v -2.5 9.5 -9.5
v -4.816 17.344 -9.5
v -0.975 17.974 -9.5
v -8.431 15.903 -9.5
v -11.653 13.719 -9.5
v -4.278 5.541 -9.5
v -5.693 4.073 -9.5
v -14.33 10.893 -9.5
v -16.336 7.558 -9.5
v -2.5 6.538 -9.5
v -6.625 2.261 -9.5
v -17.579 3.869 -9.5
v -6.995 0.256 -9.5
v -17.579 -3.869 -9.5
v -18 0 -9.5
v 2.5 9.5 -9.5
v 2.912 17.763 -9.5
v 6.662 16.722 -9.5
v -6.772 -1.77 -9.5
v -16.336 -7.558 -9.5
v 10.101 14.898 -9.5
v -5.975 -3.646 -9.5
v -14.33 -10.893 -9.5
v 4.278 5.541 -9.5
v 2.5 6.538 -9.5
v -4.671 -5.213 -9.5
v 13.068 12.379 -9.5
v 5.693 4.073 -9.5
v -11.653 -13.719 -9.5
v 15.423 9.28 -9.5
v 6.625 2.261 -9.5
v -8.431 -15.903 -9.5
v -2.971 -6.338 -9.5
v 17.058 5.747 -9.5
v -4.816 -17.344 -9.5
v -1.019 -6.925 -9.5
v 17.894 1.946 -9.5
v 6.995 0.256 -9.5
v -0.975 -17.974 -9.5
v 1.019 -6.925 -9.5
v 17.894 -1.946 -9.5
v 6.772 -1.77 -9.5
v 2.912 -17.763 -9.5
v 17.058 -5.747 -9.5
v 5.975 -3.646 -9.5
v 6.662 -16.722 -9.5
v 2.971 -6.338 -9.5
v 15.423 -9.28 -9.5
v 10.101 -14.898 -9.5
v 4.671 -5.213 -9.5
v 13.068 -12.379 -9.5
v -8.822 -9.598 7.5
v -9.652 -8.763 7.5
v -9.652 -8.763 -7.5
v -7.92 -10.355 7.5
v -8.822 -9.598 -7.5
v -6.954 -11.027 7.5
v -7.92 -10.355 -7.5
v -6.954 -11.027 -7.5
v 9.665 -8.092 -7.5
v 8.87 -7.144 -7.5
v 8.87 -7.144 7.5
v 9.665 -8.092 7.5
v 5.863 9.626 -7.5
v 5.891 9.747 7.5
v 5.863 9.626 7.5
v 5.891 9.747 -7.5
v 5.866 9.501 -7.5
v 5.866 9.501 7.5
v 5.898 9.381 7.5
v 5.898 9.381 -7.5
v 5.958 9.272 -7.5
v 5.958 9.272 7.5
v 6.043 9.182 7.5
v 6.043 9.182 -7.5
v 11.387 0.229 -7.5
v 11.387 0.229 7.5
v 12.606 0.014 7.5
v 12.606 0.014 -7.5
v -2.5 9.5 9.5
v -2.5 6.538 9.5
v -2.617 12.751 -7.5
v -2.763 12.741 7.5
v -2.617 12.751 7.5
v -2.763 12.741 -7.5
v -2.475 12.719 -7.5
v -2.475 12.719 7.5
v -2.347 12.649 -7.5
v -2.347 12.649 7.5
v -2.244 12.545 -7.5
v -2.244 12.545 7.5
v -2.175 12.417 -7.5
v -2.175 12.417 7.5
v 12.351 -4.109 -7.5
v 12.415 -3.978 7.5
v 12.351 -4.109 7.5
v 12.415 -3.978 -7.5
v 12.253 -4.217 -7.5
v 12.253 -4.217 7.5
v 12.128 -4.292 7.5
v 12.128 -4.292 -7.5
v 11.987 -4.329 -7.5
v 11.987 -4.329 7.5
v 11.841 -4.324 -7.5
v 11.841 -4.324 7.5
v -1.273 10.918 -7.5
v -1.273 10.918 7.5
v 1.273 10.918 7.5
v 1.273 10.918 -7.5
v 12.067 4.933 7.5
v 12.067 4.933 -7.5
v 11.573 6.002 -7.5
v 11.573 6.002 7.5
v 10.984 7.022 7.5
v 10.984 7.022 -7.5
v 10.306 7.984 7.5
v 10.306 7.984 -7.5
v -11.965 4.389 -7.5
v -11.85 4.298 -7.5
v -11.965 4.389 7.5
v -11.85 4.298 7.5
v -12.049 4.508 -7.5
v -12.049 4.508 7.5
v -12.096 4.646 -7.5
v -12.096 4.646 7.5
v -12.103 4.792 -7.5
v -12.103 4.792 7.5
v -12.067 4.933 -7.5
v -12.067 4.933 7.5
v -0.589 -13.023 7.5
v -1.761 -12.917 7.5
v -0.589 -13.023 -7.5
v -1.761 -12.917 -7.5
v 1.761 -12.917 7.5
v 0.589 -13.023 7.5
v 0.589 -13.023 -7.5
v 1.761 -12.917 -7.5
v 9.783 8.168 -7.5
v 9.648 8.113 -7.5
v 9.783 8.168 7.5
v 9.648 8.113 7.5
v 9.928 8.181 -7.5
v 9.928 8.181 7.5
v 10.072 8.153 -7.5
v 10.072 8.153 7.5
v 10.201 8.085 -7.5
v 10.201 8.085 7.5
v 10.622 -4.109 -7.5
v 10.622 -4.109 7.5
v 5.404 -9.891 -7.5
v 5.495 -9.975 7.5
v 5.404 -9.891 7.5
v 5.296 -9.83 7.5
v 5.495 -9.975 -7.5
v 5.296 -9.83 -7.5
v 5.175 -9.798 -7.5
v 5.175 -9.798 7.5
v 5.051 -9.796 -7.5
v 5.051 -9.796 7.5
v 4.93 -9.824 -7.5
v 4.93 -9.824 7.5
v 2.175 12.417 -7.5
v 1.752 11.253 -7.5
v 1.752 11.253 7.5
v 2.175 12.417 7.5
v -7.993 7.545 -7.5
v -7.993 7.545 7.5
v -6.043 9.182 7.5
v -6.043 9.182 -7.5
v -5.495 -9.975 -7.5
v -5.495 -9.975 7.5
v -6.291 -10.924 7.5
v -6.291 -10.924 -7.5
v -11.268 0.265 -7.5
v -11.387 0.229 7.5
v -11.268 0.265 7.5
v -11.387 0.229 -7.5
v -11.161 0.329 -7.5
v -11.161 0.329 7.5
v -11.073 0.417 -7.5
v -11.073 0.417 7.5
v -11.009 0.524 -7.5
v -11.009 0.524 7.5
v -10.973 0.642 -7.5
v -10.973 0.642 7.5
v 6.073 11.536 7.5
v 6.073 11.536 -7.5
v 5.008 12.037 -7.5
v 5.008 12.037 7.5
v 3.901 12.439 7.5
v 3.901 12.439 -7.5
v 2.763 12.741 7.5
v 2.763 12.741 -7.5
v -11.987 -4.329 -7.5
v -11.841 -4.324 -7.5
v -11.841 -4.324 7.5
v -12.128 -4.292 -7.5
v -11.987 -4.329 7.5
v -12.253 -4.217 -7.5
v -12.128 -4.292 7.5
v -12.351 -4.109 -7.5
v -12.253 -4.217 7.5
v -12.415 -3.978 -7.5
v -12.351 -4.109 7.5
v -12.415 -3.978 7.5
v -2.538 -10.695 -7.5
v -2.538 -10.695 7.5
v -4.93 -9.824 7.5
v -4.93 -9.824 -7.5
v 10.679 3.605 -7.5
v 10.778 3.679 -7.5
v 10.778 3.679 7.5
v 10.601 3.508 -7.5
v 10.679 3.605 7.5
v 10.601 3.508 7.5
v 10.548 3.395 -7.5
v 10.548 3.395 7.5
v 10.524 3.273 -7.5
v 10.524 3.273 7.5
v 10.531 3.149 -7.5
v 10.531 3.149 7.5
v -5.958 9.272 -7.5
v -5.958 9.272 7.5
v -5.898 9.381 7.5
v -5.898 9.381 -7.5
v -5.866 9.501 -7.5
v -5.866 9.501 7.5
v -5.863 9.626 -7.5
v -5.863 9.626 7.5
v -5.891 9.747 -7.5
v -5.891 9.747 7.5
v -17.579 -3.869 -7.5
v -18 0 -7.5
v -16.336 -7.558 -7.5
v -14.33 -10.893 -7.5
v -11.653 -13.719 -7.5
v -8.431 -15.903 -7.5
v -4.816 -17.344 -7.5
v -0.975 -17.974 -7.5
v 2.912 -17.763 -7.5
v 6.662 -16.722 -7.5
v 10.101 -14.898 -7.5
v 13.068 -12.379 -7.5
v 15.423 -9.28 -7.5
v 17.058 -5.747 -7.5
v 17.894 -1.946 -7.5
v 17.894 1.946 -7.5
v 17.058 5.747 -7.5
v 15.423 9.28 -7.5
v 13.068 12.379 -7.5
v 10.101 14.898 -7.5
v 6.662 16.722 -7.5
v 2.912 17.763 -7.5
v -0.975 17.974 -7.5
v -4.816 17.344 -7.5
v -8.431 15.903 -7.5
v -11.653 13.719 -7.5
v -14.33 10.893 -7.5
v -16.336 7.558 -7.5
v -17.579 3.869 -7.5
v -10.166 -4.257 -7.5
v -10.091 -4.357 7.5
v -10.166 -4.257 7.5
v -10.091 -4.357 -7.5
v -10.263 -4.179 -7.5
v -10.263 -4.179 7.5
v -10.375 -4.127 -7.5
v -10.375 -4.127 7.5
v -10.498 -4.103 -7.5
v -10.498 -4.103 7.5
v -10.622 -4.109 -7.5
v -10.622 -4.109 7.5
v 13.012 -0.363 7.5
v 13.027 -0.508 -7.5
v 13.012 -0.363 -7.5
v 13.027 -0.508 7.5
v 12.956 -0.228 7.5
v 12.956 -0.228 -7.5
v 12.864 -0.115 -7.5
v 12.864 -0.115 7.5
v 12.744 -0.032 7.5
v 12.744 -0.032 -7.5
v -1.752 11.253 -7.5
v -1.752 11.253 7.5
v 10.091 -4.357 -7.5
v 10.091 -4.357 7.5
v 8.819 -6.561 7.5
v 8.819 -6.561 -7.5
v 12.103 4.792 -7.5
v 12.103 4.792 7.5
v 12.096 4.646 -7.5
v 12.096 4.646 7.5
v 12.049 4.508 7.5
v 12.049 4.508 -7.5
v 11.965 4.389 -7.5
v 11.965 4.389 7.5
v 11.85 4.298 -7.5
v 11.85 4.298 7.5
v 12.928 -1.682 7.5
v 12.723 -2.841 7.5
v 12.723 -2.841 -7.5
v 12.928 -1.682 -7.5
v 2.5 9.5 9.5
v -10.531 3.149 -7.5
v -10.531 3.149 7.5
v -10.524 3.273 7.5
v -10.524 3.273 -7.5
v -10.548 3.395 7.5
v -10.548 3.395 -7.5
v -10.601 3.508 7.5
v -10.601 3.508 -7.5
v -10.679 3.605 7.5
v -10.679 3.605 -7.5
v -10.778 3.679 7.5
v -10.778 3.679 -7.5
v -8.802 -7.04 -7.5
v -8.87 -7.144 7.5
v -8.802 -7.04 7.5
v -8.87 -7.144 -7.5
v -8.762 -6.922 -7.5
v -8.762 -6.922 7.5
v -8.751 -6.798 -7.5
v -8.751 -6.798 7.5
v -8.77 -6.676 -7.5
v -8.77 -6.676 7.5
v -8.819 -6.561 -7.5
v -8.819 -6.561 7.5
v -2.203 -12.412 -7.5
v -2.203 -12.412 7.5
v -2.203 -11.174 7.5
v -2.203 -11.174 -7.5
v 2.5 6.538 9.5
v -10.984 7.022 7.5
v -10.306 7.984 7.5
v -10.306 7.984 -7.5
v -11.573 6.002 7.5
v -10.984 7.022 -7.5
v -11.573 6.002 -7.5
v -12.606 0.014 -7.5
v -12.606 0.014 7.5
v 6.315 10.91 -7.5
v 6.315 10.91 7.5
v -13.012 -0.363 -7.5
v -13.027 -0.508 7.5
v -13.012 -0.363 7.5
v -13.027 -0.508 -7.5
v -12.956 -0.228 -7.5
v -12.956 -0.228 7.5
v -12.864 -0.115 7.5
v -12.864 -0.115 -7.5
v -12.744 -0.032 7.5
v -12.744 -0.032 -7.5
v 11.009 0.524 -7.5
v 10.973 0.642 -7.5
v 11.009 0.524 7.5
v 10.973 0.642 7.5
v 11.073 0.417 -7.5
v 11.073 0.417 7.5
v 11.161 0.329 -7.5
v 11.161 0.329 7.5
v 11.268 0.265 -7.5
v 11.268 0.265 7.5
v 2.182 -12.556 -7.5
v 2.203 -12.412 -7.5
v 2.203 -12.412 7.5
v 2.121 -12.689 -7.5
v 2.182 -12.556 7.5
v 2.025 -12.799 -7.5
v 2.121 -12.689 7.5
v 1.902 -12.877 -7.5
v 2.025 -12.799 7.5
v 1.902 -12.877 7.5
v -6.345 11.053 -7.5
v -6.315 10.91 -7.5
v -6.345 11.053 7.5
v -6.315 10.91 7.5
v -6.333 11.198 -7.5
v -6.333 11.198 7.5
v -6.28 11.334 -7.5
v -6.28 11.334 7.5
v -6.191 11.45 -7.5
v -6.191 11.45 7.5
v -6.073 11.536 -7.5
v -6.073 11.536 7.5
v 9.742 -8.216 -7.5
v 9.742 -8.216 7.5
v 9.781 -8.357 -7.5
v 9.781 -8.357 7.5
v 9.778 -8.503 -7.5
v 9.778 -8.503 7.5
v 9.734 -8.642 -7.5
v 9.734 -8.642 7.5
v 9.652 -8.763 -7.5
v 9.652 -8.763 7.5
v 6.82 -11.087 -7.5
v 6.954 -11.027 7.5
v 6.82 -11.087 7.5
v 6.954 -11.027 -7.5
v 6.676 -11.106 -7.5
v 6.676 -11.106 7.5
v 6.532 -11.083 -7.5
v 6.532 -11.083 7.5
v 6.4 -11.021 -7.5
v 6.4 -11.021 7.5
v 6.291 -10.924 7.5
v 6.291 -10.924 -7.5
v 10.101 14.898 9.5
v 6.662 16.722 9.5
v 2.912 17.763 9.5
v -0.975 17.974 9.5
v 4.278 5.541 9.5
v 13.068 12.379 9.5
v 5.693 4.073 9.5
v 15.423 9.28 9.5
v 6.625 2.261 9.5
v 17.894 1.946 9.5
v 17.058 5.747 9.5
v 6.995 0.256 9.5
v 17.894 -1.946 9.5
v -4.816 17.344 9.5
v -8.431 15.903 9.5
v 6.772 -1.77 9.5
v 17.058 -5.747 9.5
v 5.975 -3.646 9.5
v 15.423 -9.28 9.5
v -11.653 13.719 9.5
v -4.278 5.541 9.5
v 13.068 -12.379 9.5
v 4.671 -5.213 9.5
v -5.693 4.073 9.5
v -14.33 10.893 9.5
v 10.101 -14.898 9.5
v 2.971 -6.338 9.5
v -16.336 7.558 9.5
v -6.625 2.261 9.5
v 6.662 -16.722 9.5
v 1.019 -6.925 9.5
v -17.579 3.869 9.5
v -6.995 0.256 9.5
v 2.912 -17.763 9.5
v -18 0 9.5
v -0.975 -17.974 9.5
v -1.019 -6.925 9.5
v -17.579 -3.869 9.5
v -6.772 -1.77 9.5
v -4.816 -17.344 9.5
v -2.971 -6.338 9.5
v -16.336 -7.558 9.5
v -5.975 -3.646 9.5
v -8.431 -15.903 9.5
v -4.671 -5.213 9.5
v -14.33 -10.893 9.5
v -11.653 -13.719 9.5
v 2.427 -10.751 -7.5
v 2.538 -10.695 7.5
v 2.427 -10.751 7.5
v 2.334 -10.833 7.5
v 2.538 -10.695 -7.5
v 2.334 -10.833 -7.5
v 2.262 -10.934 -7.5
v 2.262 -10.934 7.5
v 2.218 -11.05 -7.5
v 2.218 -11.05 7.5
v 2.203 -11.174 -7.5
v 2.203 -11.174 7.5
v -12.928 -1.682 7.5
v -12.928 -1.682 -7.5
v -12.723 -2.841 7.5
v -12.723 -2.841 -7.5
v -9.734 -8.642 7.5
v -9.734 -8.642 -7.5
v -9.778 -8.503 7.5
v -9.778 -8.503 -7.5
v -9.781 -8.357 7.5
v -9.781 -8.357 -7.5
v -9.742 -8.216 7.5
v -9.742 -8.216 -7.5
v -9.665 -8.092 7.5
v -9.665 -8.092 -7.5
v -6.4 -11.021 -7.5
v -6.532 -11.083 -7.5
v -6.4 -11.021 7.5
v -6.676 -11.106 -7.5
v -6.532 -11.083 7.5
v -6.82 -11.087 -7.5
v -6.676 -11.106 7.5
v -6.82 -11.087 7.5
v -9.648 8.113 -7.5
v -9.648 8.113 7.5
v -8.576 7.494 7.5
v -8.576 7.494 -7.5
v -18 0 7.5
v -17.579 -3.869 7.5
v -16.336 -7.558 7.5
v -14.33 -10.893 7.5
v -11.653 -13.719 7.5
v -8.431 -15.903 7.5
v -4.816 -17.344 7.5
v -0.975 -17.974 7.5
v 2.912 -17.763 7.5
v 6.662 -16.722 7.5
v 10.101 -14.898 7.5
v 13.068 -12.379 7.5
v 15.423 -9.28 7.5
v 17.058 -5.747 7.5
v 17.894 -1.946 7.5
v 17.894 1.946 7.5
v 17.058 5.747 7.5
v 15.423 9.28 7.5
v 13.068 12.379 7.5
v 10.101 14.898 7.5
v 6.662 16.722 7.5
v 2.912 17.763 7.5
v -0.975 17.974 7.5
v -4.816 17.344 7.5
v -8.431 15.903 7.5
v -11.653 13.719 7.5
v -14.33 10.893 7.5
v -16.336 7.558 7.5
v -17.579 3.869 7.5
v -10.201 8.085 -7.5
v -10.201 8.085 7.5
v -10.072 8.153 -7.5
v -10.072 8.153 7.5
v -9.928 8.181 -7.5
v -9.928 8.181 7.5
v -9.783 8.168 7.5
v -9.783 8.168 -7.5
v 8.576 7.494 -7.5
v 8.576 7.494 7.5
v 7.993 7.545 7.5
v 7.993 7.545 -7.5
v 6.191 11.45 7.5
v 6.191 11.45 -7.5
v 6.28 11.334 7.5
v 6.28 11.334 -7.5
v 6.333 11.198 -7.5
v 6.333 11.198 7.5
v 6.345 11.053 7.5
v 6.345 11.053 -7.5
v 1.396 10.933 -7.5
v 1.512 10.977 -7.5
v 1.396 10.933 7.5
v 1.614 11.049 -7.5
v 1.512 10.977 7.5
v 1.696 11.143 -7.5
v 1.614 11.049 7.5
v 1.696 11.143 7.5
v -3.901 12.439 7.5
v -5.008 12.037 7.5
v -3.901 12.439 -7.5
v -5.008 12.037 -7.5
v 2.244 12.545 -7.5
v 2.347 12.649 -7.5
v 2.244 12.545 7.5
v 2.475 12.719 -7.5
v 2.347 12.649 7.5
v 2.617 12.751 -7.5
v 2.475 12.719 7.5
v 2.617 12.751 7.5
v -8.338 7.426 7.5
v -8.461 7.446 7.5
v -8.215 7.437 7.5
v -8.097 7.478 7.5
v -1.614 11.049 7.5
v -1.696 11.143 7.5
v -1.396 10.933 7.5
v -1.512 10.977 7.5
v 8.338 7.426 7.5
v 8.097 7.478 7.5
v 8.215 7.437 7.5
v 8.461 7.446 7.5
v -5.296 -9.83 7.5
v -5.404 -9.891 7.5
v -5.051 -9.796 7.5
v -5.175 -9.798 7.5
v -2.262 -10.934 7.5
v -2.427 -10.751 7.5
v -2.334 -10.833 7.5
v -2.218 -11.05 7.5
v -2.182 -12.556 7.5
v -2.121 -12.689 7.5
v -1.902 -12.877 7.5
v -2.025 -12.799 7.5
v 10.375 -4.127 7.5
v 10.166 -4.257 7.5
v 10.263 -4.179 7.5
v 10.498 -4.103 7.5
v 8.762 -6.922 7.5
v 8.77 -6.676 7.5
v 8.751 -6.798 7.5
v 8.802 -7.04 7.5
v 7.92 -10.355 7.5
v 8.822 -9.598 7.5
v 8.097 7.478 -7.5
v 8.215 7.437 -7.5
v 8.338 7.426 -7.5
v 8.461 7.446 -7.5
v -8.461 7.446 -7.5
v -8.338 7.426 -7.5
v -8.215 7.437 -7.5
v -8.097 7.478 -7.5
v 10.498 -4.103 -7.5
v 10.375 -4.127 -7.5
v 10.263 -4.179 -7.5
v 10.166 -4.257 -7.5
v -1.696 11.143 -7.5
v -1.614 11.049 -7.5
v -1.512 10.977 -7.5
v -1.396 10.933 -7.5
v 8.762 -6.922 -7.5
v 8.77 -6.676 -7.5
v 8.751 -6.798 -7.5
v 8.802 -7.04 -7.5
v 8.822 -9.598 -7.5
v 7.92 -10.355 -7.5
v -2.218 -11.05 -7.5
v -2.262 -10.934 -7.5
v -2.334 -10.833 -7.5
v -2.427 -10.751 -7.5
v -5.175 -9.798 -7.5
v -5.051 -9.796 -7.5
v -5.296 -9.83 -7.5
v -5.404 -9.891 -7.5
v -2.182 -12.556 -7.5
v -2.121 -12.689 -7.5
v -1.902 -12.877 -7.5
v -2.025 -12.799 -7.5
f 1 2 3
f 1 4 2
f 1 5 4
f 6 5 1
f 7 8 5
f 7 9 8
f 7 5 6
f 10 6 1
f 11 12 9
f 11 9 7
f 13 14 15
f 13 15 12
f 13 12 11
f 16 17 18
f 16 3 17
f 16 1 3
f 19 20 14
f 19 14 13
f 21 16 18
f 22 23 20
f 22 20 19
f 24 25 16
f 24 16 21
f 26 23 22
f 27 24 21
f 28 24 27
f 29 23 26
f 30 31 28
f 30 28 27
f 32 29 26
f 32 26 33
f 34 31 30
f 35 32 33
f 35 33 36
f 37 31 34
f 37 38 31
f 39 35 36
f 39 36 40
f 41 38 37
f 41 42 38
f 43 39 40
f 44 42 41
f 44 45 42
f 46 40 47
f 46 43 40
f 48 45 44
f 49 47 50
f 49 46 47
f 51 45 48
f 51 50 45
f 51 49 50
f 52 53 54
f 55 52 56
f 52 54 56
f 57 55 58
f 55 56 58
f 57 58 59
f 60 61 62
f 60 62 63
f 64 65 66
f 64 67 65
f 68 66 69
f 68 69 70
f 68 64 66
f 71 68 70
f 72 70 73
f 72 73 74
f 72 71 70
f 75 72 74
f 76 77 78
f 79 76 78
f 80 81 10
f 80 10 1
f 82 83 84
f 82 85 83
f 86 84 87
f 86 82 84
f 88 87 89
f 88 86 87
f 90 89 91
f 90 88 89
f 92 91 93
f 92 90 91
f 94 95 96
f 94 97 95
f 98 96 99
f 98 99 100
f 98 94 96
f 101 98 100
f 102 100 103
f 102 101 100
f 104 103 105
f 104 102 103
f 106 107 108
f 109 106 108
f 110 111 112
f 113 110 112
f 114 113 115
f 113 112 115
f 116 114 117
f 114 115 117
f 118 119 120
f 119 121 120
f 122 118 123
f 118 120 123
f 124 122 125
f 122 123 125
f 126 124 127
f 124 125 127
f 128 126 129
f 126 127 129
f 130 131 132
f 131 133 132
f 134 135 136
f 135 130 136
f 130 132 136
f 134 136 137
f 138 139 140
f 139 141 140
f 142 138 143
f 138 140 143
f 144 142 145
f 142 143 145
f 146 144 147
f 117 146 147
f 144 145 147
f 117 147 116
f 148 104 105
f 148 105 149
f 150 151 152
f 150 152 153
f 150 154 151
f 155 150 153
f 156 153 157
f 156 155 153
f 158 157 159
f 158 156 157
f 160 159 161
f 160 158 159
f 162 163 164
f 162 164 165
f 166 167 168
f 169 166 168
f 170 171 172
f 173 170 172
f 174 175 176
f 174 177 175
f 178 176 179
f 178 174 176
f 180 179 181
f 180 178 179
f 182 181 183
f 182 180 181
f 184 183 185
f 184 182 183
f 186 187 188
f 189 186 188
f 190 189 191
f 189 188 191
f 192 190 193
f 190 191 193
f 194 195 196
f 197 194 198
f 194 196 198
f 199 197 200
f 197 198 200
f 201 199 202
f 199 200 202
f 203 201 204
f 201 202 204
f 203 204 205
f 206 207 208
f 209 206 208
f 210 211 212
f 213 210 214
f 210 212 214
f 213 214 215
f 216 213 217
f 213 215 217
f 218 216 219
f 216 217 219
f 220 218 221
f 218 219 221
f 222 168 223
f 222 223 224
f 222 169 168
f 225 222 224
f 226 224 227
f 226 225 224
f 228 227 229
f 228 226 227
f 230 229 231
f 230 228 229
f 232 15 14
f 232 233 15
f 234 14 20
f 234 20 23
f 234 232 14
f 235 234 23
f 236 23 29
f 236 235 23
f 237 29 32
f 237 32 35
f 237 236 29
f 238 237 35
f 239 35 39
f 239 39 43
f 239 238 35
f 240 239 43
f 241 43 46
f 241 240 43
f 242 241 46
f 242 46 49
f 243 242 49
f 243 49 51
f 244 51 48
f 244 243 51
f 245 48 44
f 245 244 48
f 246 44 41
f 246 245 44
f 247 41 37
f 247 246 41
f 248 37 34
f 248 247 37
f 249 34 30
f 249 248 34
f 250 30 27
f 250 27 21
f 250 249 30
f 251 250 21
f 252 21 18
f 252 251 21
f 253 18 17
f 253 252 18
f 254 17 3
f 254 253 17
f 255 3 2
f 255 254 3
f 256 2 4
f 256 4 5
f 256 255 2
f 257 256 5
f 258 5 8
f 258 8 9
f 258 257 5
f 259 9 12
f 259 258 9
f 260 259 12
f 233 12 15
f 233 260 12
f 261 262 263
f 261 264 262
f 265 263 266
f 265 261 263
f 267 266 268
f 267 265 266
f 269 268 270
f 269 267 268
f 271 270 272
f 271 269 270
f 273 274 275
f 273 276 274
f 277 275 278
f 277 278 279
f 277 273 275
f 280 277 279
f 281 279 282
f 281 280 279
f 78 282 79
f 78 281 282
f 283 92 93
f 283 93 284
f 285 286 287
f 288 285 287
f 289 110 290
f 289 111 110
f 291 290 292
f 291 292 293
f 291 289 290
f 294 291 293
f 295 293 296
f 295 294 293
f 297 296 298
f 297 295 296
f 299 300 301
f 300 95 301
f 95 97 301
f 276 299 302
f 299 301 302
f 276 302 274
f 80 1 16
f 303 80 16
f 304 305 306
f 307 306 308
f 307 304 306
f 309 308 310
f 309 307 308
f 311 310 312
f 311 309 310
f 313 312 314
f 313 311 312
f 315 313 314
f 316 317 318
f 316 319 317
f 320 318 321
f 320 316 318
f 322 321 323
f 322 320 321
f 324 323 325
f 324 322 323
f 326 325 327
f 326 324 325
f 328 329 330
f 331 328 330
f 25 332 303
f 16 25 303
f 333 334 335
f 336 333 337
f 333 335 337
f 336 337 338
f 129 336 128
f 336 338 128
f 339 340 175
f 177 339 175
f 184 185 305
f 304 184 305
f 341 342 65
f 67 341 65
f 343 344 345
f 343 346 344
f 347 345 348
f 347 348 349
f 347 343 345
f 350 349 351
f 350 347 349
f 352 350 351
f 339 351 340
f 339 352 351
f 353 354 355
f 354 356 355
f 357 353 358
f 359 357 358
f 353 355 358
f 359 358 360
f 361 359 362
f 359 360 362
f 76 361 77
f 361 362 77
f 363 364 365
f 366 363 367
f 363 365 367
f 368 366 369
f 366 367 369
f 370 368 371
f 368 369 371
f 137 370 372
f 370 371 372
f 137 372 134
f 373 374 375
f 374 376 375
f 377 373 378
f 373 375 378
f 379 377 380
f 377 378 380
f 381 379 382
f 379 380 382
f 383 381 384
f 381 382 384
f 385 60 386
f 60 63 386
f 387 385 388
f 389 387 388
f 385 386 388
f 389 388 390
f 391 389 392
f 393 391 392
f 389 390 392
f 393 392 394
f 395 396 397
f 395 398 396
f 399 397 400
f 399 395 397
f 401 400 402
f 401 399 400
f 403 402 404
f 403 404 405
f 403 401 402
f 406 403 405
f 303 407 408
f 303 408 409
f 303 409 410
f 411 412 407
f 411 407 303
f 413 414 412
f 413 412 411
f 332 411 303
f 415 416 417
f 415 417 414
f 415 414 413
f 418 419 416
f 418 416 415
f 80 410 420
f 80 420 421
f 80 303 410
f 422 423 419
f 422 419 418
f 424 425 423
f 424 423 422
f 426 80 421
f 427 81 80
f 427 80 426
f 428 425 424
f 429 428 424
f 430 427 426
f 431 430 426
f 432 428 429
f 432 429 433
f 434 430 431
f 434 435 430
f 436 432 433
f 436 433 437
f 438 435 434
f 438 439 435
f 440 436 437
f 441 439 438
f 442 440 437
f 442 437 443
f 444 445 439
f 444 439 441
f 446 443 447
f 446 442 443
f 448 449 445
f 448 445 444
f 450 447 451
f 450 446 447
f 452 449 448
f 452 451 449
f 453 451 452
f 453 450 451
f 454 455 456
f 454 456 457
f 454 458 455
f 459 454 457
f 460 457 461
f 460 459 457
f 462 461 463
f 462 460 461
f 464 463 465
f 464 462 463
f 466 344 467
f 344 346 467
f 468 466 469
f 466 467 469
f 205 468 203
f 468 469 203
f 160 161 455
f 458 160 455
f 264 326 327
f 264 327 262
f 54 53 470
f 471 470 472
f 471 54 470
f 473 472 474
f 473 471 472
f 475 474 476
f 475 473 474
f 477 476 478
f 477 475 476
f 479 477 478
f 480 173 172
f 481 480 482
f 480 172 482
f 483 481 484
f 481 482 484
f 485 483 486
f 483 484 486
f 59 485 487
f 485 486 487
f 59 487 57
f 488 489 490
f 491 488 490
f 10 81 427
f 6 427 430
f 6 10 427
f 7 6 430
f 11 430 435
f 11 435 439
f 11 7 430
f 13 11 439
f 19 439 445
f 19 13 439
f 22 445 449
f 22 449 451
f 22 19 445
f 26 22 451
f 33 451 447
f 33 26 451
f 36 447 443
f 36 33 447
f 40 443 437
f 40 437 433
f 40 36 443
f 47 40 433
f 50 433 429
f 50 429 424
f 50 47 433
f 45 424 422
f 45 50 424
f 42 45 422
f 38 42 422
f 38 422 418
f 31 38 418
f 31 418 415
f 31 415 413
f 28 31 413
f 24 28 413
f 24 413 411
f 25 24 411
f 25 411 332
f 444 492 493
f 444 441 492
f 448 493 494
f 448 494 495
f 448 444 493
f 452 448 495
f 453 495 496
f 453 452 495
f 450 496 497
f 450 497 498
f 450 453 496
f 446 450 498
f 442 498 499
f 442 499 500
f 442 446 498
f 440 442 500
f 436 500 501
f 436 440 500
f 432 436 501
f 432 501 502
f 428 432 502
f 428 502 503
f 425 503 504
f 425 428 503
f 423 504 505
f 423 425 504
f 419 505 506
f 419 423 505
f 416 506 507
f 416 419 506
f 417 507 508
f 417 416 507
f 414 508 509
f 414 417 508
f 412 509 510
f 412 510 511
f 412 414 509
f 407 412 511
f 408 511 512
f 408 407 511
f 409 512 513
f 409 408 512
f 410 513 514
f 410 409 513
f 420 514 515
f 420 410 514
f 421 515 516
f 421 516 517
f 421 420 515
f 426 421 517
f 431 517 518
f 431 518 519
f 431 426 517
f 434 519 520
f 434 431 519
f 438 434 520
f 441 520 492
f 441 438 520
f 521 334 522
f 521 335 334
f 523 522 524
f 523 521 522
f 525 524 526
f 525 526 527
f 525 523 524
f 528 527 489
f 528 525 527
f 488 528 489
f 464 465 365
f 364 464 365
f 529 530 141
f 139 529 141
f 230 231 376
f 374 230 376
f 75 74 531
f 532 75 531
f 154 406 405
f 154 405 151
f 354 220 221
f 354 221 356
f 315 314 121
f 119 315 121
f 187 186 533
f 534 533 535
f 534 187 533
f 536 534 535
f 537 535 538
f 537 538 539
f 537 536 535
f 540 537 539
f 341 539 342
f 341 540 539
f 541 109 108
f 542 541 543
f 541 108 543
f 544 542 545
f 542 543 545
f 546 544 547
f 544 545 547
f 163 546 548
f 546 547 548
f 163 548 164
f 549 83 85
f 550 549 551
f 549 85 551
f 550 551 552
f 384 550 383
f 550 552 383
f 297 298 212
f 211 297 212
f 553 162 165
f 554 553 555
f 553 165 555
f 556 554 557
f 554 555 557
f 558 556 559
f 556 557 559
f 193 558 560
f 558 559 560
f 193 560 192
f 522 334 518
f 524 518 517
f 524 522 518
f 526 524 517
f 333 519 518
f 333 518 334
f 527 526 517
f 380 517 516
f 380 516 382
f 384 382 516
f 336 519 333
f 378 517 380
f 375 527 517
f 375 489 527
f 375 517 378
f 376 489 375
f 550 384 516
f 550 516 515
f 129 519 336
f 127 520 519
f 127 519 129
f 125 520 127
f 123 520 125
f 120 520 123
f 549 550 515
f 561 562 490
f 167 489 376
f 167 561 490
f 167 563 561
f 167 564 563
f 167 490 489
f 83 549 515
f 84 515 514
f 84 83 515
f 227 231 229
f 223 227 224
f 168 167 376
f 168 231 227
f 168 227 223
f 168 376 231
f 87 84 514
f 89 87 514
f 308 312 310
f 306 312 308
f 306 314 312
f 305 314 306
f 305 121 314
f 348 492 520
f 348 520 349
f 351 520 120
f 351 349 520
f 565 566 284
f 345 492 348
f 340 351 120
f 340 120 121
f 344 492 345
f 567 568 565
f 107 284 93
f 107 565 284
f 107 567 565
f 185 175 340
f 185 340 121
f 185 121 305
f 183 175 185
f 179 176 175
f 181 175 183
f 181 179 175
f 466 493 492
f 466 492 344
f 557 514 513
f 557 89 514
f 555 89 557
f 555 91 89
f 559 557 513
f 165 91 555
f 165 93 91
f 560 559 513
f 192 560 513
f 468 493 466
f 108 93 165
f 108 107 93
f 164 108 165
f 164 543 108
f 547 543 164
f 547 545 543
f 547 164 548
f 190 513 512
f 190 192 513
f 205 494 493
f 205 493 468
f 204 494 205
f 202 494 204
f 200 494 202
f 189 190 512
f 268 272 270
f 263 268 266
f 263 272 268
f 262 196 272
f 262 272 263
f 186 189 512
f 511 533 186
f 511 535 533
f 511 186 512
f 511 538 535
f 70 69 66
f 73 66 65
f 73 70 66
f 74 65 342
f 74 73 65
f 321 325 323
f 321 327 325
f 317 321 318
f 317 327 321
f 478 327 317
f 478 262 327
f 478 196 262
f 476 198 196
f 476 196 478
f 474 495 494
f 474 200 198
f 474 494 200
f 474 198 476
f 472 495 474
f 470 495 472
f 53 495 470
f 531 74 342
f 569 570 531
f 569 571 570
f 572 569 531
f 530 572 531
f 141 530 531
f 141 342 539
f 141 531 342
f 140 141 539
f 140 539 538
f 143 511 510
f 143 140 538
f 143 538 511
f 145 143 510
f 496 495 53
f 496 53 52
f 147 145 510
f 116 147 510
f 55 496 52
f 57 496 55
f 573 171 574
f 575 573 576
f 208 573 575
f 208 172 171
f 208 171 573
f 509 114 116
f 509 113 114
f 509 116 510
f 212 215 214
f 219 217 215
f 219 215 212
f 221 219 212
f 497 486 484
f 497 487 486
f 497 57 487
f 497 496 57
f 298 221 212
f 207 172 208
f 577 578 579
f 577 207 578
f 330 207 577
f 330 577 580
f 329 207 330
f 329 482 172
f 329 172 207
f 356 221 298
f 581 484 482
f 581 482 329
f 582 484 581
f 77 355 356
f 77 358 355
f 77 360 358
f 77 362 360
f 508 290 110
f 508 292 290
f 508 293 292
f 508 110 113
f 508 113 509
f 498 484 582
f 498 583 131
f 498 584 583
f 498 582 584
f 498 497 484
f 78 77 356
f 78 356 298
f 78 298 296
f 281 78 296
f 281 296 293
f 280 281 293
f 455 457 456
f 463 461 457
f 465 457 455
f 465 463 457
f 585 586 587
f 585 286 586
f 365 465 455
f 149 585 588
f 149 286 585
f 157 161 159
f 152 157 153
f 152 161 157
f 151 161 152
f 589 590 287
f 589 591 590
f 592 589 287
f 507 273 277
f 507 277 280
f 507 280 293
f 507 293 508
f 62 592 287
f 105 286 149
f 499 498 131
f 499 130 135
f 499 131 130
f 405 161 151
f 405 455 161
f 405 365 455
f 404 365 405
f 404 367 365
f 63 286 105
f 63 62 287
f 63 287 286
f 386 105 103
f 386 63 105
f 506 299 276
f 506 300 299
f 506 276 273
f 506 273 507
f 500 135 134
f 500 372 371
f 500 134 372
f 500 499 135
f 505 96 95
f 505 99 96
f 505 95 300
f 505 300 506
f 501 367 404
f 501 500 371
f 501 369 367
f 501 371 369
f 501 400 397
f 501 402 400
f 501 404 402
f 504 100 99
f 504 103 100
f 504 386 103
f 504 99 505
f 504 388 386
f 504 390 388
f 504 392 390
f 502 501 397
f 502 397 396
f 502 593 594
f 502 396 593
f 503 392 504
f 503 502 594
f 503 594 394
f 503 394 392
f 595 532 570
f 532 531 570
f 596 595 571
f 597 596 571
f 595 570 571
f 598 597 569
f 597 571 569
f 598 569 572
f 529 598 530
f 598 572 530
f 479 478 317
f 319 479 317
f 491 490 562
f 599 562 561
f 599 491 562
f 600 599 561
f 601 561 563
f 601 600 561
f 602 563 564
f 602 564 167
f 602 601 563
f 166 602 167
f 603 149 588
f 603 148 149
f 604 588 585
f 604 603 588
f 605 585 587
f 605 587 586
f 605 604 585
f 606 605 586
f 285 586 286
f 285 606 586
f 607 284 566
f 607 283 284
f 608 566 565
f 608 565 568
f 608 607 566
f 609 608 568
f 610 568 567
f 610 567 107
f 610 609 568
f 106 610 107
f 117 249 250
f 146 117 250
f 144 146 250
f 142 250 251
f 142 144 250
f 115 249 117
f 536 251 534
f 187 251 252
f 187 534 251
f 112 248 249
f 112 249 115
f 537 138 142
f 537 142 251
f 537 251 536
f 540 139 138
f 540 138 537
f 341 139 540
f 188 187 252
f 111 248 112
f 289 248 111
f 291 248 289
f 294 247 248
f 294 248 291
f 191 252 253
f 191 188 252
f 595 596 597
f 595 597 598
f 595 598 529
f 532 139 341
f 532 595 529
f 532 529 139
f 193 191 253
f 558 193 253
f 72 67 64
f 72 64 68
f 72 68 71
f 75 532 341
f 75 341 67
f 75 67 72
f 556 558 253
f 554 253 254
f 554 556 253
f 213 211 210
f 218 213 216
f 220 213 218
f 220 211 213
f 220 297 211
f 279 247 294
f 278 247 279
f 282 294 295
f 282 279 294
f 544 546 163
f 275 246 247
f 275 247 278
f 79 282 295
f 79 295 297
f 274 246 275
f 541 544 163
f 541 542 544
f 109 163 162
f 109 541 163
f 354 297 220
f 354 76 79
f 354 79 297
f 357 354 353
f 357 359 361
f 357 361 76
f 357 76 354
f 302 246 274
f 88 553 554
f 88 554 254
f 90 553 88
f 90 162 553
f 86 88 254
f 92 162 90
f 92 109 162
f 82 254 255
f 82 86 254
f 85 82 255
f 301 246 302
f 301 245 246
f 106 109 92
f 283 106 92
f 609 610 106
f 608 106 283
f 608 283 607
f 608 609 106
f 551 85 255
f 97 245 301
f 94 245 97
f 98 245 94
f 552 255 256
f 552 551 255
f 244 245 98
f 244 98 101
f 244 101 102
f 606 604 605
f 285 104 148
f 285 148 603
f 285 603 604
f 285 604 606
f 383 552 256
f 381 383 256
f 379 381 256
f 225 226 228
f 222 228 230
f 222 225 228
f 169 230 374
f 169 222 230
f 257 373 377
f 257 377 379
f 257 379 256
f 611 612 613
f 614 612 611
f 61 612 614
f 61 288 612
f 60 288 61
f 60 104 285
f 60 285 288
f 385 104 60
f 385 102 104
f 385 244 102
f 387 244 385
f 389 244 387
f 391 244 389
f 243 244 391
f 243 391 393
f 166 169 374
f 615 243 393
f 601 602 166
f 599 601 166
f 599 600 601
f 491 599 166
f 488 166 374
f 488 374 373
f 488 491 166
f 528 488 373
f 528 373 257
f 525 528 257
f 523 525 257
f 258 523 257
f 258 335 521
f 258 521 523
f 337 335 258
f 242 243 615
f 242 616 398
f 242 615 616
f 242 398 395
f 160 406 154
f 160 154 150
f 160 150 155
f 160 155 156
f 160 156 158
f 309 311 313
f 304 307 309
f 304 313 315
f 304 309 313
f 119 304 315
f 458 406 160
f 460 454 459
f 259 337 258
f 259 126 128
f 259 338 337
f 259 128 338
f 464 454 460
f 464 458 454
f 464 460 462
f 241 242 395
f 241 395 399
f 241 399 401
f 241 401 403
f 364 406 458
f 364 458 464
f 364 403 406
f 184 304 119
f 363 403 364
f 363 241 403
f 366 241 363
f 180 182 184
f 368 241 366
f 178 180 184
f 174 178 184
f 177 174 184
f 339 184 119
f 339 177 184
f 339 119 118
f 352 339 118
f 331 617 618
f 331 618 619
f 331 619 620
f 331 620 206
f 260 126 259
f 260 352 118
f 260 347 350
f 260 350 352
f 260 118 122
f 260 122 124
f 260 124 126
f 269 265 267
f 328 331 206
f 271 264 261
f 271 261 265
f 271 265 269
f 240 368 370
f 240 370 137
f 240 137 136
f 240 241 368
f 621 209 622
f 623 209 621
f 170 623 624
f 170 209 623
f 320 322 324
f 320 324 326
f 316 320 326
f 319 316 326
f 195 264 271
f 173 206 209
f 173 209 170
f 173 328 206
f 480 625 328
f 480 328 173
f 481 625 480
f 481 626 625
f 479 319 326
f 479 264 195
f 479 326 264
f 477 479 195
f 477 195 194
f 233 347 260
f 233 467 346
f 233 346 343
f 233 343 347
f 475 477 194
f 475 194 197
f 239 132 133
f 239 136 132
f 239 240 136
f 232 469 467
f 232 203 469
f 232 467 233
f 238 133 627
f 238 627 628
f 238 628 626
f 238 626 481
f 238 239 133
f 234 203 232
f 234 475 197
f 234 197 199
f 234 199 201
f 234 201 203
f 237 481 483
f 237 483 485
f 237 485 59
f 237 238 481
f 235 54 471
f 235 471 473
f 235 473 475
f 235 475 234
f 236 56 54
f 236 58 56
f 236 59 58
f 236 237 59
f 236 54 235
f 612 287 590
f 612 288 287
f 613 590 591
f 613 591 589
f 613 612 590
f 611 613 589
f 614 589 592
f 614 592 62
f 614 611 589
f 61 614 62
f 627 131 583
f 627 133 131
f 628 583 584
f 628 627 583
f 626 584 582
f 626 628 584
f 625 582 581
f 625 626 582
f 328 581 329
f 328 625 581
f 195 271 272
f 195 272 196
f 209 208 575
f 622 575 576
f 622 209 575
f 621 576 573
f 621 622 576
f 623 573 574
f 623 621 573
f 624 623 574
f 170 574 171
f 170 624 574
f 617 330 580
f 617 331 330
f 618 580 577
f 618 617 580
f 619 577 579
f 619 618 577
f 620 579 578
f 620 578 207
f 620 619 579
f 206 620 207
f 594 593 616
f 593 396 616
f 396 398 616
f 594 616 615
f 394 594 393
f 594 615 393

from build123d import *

# Parameters (mm, degrees)
CUT_EXTRUDE1_DEPTH              = 28.170756338
CUT_EXTRUDE1_DEPTH_BACK         = 28.170756338
SKETCH3_W                       = 5
SKETCH3_H                       = 9.5
BOSS_EXTRUDE1_REACH             = 29.171
SKETCH4_R                       = 13.03675669
SKETCH4_R_2                     = 11
BOSS_EXTRUDE1_DIRECTION_2_REACH = 29.171
CUT_EXTRUDE2_REACH              = 29.171
CUT_EXTRUDE2_DIRECTION_2_REACH  = 29.171
FILLET1_R                       = 0.51


with BuildPart() as part:
    # Sketch2 → Revolve1 (revolve)
    with BuildSketch(Plane(origin=(0, 0, 0), x_dir=(1, 0, 0), z_dir=(0, 1, 0)), mode=Mode.PRIVATE) as revolve1_sk:
        Polygon((7, -9.5), (7, 9.5), (18, 9.5), (18, 7.5), (11, 7.5), (11, -7.5), (18, -7.5), (18, -9.5), align=None)
    revolve(revolve1_sk.sketch.rotate(Axis((0, 0, -36.129595921), (0, 0, 1)), 180), axis=Axis((0, 0, -36.129595921), (0, 0, 1)))

    # Sketch3 → Cut-Extrude1 (cut, two sides: drawn at the far end of the back side and taken through both)
    with BuildSketch(Plane.XY.offset(-CUT_EXTRUDE1_DEPTH_BACK)):
        with Locations((0, 4.75)):
            Rectangle(SKETCH3_W, SKETCH3_H)
    extrude(amount=CUT_EXTRUDE1_DEPTH + CUT_EXTRUDE1_DEPTH_BACK, mode=Mode.SUBTRACT)

    # Sketch4 → Boss-Extrude1 (add, up to next)
    with BuildSketch(Plane.XY, mode=Mode.PRIVATE) as boss_extrude1_sk1:
        Circle(SKETCH4_R)
        Circle(SKETCH4_R_2, mode=Mode.SUBTRACT)
    boss_extrude1_tool1 = extrude(boss_extrude1_sk1.sketch, amount=BOSS_EXTRUDE1_REACH, mode=Mode.PRIVATE) - part.part
    add(boss_extrude1_tool1.solids().sort_by_distance((-12.668022, 0, 0))[0])

    # Sketch4 → Boss-Extrude1 direction 2 (add, up to next)
    with BuildSketch(Plane.XY, mode=Mode.PRIVATE) as boss_extrude1_direction_2_sk1:
        Circle(SKETCH4_R)
        Circle(SKETCH4_R_2, mode=Mode.SUBTRACT)
    boss_extrude1_direction_2_tool1 = extrude(boss_extrude1_direction_2_sk1.sketch, amount=-BOSS_EXTRUDE1_DIRECTION_2_REACH, mode=Mode.PRIVATE) - part.part
    add(boss_extrude1_direction_2_tool1.solids().sort_by_distance((-12.668022, 0, 0))[0])

    # Cut-Extrude2: up to this face of the body (flat: up to its plane)
    cut_extrude2_end = Plane(part.part.faces().sort_by_distance((17.490883118, 0, -7.5))[0])
    # Sketch5 → Cut-Extrude2 (cut, up to the picked face)
    with BuildSketch(Plane.XY, mode=Mode.PRIVATE) as cut_extrude2_sk1:
        Polygon((-1.629816853, 10.917758962), (1.629816853, 10.917758962), (2.401068952, 13.03675669), (-2.401068952, 13.03675669), align=None)
    cut_extrude2_tool1 = split(extrude(cut_extrude2_sk1.sketch, amount=-CUT_EXTRUDE2_REACH, mode=Mode.PRIVATE), bisect_by=cut_extrude2_end, keep=Keep.BOTH, mode=Mode.PRIVATE)
    # Sketch5 → Cut-Extrude2 (cut, up to the picked face)
    with BuildSketch(Plane.XY, mode=Mode.PRIVATE) as cut_extrude2_sk2:
        Polygon((5.769288043, 9.411114663), (8.26631233, 7.315862506), (10.219191199, 8.443357646), (6.540540143, 11.530112391), align=None)
    cut_extrude2_tool2 = split(extrude(cut_extrude2_sk2.sketch, amount=-CUT_EXTRUDE2_REACH, mode=Mode.PRIVATE), bisect_by=cut_extrude2_end, keep=Keep.BOTH, mode=Mode.PRIVATE)
    # Sketch5 → Cut-Extrude2 (cut, up to the picked face)
    with BuildSketch(Plane.XY, mode=Mode.PRIVATE) as cut_extrude2_sk3:
        Polygon((10.468878945, 3.50090522), (11.034908398, 0.290792676), (13.25564031, -0.100782277), (12.421757815, 4.628400361), align=None)
    cut_extrude2_tool3 = split(extrude(cut_extrude2_sk3.sketch, amount=-CUT_EXTRUDE2_REACH, mode=Mode.PRIVATE), bisect_by=cut_extrude2_end, keep=Keep.BOTH, mode=Mode.PRIVATE)
    # Sketch5 → Cut-Extrude2 (cut, up to the picked face)
    with BuildSketch(Plane.XY, mode=Mode.PRIVATE) as cut_extrude2_sk4:
        Polygon((10.26996504, -4.047416683), (8.640148187, -6.870342279), (10.089628001, -8.597765054), (12.490696953, -4.438991636), align=None)
    cut_extrude2_tool4 = split(extrude(cut_extrude2_sk4.sketch, amount=-CUT_EXTRUDE2_REACH, mode=Mode.PRIVATE), bisect_by=cut_extrude2_end, keep=Keep.BOTH, mode=Mode.PRIVATE)
    # Sketch5 → Cut-Extrude2 (cut, up to the picked face)
    with BuildSketch(Plane.XY, mode=Mode.PRIVATE) as cut_extrude2_sk5:
        Polygon((5.265620355, -9.701907339), (2.202566616, -10.816767726), (2.202566616, -13.071758008), (6.715100168, -11.429330114), align=None)
    cut_extrude2_tool5 = split(extrude(cut_extrude2_sk5.sketch, amount=-CUT_EXTRUDE2_REACH, mode=Mode.PRIVATE), bisect_by=cut_extrude2_end, keep=Keep.BOTH, mode=Mode.PRIVATE)
    # Sketch5 → Cut-Extrude2 (cut, up to the picked face)
    with BuildSketch(Plane.XY, mode=Mode.PRIVATE) as cut_extrude2_sk6:
        Polygon((-2.202566616, -10.816767726), (-5.265620355, -9.701907339), (-6.715100168, -11.429330114), (-2.202566616, -13.071758008), align=None)
    cut_extrude2_tool6 = split(extrude(cut_extrude2_sk6.sketch, amount=-CUT_EXTRUDE2_REACH, mode=Mode.PRIVATE), bisect_by=cut_extrude2_end, keep=Keep.BOTH, mode=Mode.PRIVATE)
    # Sketch5 → Cut-Extrude2 (cut, up to the picked face)
    with BuildSketch(Plane.XY, mode=Mode.PRIVATE) as cut_extrude2_sk7:
        Polygon((-8.640148187, -6.870342279), (-10.26996504, -4.047416683), (-12.490696953, -4.438991636), (-10.089628001, -8.597765054), align=None)
    cut_extrude2_tool7 = split(extrude(cut_extrude2_sk7.sketch, amount=-CUT_EXTRUDE2_REACH, mode=Mode.PRIVATE), bisect_by=cut_extrude2_end, keep=Keep.BOTH, mode=Mode.PRIVATE)
    # Sketch5 → Cut-Extrude2 (cut, up to the picked face)
    with BuildSketch(Plane.XY, mode=Mode.PRIVATE) as cut_extrude2_sk8:
        Polygon((-11.034908398, 0.290792676), (-10.468878945, 3.50090522), (-12.421757815, 4.628400361), (-13.25564031, -0.100782277), align=None)
    cut_extrude2_tool8 = split(extrude(cut_extrude2_sk8.sketch, amount=-CUT_EXTRUDE2_REACH, mode=Mode.PRIVATE), bisect_by=cut_extrude2_end, keep=Keep.BOTH, mode=Mode.PRIVATE)
    # Sketch5 → Cut-Extrude2 (cut, up to the picked face)
    with BuildSketch(Plane.XY, mode=Mode.PRIVATE) as cut_extrude2_sk9:
        Polygon((-8.26631233, 7.315862506), (-5.769288043, 9.411114663), (-6.540540143, 11.530112391), (-10.219191199, 8.443357646), align=None)
    cut_extrude2_tool9 = split(extrude(cut_extrude2_sk9.sketch, amount=-CUT_EXTRUDE2_REACH, mode=Mode.PRIVATE), bisect_by=cut_extrude2_end, keep=Keep.BOTH, mode=Mode.PRIVATE)
    add(cut_extrude2_tool1.solids().sort_by(Axis((0, 12.044831, 0), (0, 0, -1)))[0], mode=Mode.SUBTRACT)
    add(cut_extrude2_tool2.solids().sort_by(Axis((7.742268, 9.226876, 0), (0, 0, -1)))[0], mode=Mode.SUBTRACT)
    add(cut_extrude2_tool3.solids().sort_by(Axis((11.861843, 2.091563, 0), (0, 0, -1)))[0], mode=Mode.SUBTRACT)
    add(cut_extrude2_tool4.solids().sort_by(Axis((10.43113, -6.022416, 0), (0, 0, -1)))[0], mode=Mode.SUBTRACT)
    add(cut_extrude2_tool5.solids().sort_by(Axis((4.119575, -11.318439, 0), (0, 0, -1)))[0], mode=Mode.SUBTRACT)
    add(cut_extrude2_tool6.solids().sort_by(Axis((-4.119575, -11.318439, 0), (0, 0, -1)))[0], mode=Mode.SUBTRACT)
    add(cut_extrude2_tool7.solids().sort_by(Axis((-10.43113, -6.022416, 0), (0, 0, -1)))[0], mode=Mode.SUBTRACT)
    add(cut_extrude2_tool8.solids().sort_by(Axis((-11.861843, 2.091563, 0), (0, 0, -1)))[0], mode=Mode.SUBTRACT)
    add(cut_extrude2_tool9.solids().sort_by(Axis((-7.742268, 9.226876, 0), (0, 0, -1)))[0], mode=Mode.SUBTRACT)

    # Cut-Extrude2 direction 2: up to this face of the body (flat: up to its plane)
    cut_extrude2_direction_2_end = Plane(part.part.faces().sort_by_distance((17.490883118, 0, 7.5))[0])
    # Sketch5 → Cut-Extrude2 direction 2 (cut, up to the picked face)
    with BuildSketch(Plane.XY, mode=Mode.PRIVATE) as cut_extrude2_direction_2_sk1:
        Polygon((-1.629816853, 10.917758962), (1.629816853, 10.917758962), (2.401068952, 13.03675669), (-2.401068952, 13.03675669), align=None)
    cut_extrude2_direction_2_tool1 = split(extrude(cut_extrude2_direction_2_sk1.sketch, amount=CUT_EXTRUDE2_DIRECTION_2_REACH, mode=Mode.PRIVATE), bisect_by=cut_extrude2_direction_2_end, keep=Keep.BOTH, mode=Mode.PRIVATE)
    # Sketch5 → Cut-Extrude2 direction 2 (cut, up to the picked face)
    with BuildSketch(Plane.XY, mode=Mode.PRIVATE) as cut_extrude2_direction_2_sk2:
        Polygon((5.769288043, 9.411114663), (8.26631233, 7.315862506), (10.219191199, 8.443357646), (6.540540143, 11.530112391), align=None)
    cut_extrude2_direction_2_tool2 = split(extrude(cut_extrude2_direction_2_sk2.sketch, amount=CUT_EXTRUDE2_DIRECTION_2_REACH, mode=Mode.PRIVATE), bisect_by=cut_extrude2_direction_2_end, keep=Keep.BOTH, mode=Mode.PRIVATE)
    # Sketch5 → Cut-Extrude2 direction 2 (cut, up to the picked face)
    with BuildSketch(Plane.XY, mode=Mode.PRIVATE) as cut_extrude2_direction_2_sk3:
        Polygon((10.468878945, 3.50090522), (11.034908398, 0.290792676), (13.25564031, -0.100782277), (12.421757815, 4.628400361), align=None)
    cut_extrude2_direction_2_tool3 = split(extrude(cut_extrude2_direction_2_sk3.sketch, amount=CUT_EXTRUDE2_DIRECTION_2_REACH, mode=Mode.PRIVATE), bisect_by=cut_extrude2_direction_2_end, keep=Keep.BOTH, mode=Mode.PRIVATE)
    # Sketch5 → Cut-Extrude2 direction 2 (cut, up to the picked face)
    with BuildSketch(Plane.XY, mode=Mode.PRIVATE) as cut_extrude2_direction_2_sk4:
        Polygon((10.26996504, -4.047416683), (8.640148187, -6.870342279), (10.089628001, -8.597765054), (12.490696953, -4.438991636), align=None)
    cut_extrude2_direction_2_tool4 = split(extrude(cut_extrude2_direction_2_sk4.sketch, amount=CUT_EXTRUDE2_DIRECTION_2_REACH, mode=Mode.PRIVATE), bisect_by=cut_extrude2_direction_2_end, keep=Keep.BOTH, mode=Mode.PRIVATE)
    # Sketch5 → Cut-Extrude2 direction 2 (cut, up to the picked face)
    with BuildSketch(Plane.XY, mode=Mode.PRIVATE) as cut_extrude2_direction_2_sk5:
        Polygon((5.265620355, -9.701907339), (2.202566616, -10.816767726), (2.202566616, -13.071758008), (6.715100168, -11.429330114), align=None)
    cut_extrude2_direction_2_tool5 = split(extrude(cut_extrude2_direction_2_sk5.sketch, amount=CUT_EXTRUDE2_DIRECTION_2_REACH, mode=Mode.PRIVATE), bisect_by=cut_extrude2_direction_2_end, keep=Keep.BOTH, mode=Mode.PRIVATE)
    # Sketch5 → Cut-Extrude2 direction 2 (cut, up to the picked face)
    with BuildSketch(Plane.XY, mode=Mode.PRIVATE) as cut_extrude2_direction_2_sk6:
        Polygon((-2.202566616, -10.816767726), (-5.265620355, -9.701907339), (-6.715100168, -11.429330114), (-2.202566616, -13.071758008), align=None)
    cut_extrude2_direction_2_tool6 = split(extrude(cut_extrude2_direction_2_sk6.sketch, amount=CUT_EXTRUDE2_DIRECTION_2_REACH, mode=Mode.PRIVATE), bisect_by=cut_extrude2_direction_2_end, keep=Keep.BOTH, mode=Mode.PRIVATE)
    # Sketch5 → Cut-Extrude2 direction 2 (cut, up to the picked face)
    with BuildSketch(Plane.XY, mode=Mode.PRIVATE) as cut_extrude2_direction_2_sk7:
        Polygon((-8.640148187, -6.870342279), (-10.26996504, -4.047416683), (-12.490696953, -4.438991636), (-10.089628001, -8.597765054), align=None)
    cut_extrude2_direction_2_tool7 = split(extrude(cut_extrude2_direction_2_sk7.sketch, amount=CUT_EXTRUDE2_DIRECTION_2_REACH, mode=Mode.PRIVATE), bisect_by=cut_extrude2_direction_2_end, keep=Keep.BOTH, mode=Mode.PRIVATE)
    # Sketch5 → Cut-Extrude2 direction 2 (cut, up to the picked face)
    with BuildSketch(Plane.XY, mode=Mode.PRIVATE) as cut_extrude2_direction_2_sk8:
        Polygon((-11.034908398, 0.290792676), (-10.468878945, 3.50090522), (-12.421757815, 4.628400361), (-13.25564031, -0.100782277), align=None)
    cut_extrude2_direction_2_tool8 = split(extrude(cut_extrude2_direction_2_sk8.sketch, amount=CUT_EXTRUDE2_DIRECTION_2_REACH, mode=Mode.PRIVATE), bisect_by=cut_extrude2_direction_2_end, keep=Keep.BOTH, mode=Mode.PRIVATE)
    # Sketch5 → Cut-Extrude2 direction 2 (cut, up to the picked face)
    with BuildSketch(Plane.XY, mode=Mode.PRIVATE) as cut_extrude2_direction_2_sk9:
        Polygon((-8.26631233, 7.315862506), (-5.769288043, 9.411114663), (-6.540540143, 11.530112391), (-10.219191199, 8.443357646), align=None)
    cut_extrude2_direction_2_tool9 = split(extrude(cut_extrude2_direction_2_sk9.sketch, amount=CUT_EXTRUDE2_DIRECTION_2_REACH, mode=Mode.PRIVATE), bisect_by=cut_extrude2_direction_2_end, keep=Keep.BOTH, mode=Mode.PRIVATE)
    add(cut_extrude2_direction_2_tool1.solids().sort_by(Axis((0, 12.044831, 0), (0, 0, 1)))[0], mode=Mode.SUBTRACT)
    add(cut_extrude2_direction_2_tool2.solids().sort_by(Axis((7.742268, 9.226876, 0), (0, 0, 1)))[0], mode=Mode.SUBTRACT)
    add(cut_extrude2_direction_2_tool3.solids().sort_by(Axis((11.861843, 2.091563, 0), (0, 0, 1)))[0], mode=Mode.SUBTRACT)
    add(cut_extrude2_direction_2_tool4.solids().sort_by(Axis((10.43113, -6.022416, 0), (0, 0, 1)))[0], mode=Mode.SUBTRACT)
    add(cut_extrude2_direction_2_tool5.solids().sort_by(Axis((4.119575, -11.318439, 0), (0, 0, 1)))[0], mode=Mode.SUBTRACT)
    add(cut_extrude2_direction_2_tool6.solids().sort_by(Axis((-4.119575, -11.318439, 0), (0, 0, 1)))[0], mode=Mode.SUBTRACT)
    add(cut_extrude2_direction_2_tool7.solids().sort_by(Axis((-10.43113, -6.022416, 0), (0, 0, 1)))[0], mode=Mode.SUBTRACT)
    add(cut_extrude2_direction_2_tool8.solids().sort_by(Axis((-11.861843, 2.091563, 0), (0, 0, 1)))[0], mode=Mode.SUBTRACT)
    add(cut_extrude2_direction_2_tool9.solids().sort_by(Axis((-7.742268, 9.226876, 0), (0, 0, 1)))[0], mode=Mode.SUBTRACT)

    # Fillet1
    fillet1_edges = [part.edges().sort_by_distance(p)[0] for p in [
        (-5.769288043, 9.411114663, 0),
        (-8.26631233, 7.315862506, 0),
        (-10.468878945, 3.50090522, 0),
        (-11.034908398, 0.290792676, 0),
        (-10.26996504, -4.047416683, 0),
        (-8.640148187, -6.870342279, 0),
        (-5.265620355, -9.701907339, 0),
        (-2.202566616, -10.816767726, 0),
        (2.202566616, -10.816767726, 0),
        (5.265620355, -9.701907339, 0),
        (8.640148187, -6.870342279, 0),
        (10.26996504, -4.047416683, 0),
        (11.034908398, 0.290792676, 0),
        (10.468878945, 3.50090522, 0),
        (8.26631233, 7.315862506, 0),
        (5.769288043, 9.411114663, 0),
        (1.629816853, 10.917758962, 0),
        (-1.629816853, 10.917758962, 0),
        (-2.325, 12.827758962, 0),
        (2.325, 12.827758962, 0),
        (6.464471191, 11.321114663, 0),
        (10.026577851, 8.332152278, 0),
        (12.229144467, 4.517194993, 0),
        (13.036608493, -0.062161058, 0),
        (12.271665135, -4.400370417, 0),
        (9.946665135, -8.427388545, 0),
        (6.572137302, -11.258953605, 0),
        (2.202566616, -12.849347271, 0),
        (-2.202566616, -12.849347271, 0),
        (-6.572137302, -11.258953605, 0),
        (-9.946665135, -8.427388545, 0),
        (-12.271665135, -4.400370417, 0),
        (-13.036608493, -0.062161058, 0),
        (-12.229144467, 4.517194993, 0),
        (-10.026577851, 8.332152278, 0),
        (-6.464471191, 11.321114663, 0),
    ]]
    fillet(fillet1_edges, radius=FILLET1_R)


solid = part.part
